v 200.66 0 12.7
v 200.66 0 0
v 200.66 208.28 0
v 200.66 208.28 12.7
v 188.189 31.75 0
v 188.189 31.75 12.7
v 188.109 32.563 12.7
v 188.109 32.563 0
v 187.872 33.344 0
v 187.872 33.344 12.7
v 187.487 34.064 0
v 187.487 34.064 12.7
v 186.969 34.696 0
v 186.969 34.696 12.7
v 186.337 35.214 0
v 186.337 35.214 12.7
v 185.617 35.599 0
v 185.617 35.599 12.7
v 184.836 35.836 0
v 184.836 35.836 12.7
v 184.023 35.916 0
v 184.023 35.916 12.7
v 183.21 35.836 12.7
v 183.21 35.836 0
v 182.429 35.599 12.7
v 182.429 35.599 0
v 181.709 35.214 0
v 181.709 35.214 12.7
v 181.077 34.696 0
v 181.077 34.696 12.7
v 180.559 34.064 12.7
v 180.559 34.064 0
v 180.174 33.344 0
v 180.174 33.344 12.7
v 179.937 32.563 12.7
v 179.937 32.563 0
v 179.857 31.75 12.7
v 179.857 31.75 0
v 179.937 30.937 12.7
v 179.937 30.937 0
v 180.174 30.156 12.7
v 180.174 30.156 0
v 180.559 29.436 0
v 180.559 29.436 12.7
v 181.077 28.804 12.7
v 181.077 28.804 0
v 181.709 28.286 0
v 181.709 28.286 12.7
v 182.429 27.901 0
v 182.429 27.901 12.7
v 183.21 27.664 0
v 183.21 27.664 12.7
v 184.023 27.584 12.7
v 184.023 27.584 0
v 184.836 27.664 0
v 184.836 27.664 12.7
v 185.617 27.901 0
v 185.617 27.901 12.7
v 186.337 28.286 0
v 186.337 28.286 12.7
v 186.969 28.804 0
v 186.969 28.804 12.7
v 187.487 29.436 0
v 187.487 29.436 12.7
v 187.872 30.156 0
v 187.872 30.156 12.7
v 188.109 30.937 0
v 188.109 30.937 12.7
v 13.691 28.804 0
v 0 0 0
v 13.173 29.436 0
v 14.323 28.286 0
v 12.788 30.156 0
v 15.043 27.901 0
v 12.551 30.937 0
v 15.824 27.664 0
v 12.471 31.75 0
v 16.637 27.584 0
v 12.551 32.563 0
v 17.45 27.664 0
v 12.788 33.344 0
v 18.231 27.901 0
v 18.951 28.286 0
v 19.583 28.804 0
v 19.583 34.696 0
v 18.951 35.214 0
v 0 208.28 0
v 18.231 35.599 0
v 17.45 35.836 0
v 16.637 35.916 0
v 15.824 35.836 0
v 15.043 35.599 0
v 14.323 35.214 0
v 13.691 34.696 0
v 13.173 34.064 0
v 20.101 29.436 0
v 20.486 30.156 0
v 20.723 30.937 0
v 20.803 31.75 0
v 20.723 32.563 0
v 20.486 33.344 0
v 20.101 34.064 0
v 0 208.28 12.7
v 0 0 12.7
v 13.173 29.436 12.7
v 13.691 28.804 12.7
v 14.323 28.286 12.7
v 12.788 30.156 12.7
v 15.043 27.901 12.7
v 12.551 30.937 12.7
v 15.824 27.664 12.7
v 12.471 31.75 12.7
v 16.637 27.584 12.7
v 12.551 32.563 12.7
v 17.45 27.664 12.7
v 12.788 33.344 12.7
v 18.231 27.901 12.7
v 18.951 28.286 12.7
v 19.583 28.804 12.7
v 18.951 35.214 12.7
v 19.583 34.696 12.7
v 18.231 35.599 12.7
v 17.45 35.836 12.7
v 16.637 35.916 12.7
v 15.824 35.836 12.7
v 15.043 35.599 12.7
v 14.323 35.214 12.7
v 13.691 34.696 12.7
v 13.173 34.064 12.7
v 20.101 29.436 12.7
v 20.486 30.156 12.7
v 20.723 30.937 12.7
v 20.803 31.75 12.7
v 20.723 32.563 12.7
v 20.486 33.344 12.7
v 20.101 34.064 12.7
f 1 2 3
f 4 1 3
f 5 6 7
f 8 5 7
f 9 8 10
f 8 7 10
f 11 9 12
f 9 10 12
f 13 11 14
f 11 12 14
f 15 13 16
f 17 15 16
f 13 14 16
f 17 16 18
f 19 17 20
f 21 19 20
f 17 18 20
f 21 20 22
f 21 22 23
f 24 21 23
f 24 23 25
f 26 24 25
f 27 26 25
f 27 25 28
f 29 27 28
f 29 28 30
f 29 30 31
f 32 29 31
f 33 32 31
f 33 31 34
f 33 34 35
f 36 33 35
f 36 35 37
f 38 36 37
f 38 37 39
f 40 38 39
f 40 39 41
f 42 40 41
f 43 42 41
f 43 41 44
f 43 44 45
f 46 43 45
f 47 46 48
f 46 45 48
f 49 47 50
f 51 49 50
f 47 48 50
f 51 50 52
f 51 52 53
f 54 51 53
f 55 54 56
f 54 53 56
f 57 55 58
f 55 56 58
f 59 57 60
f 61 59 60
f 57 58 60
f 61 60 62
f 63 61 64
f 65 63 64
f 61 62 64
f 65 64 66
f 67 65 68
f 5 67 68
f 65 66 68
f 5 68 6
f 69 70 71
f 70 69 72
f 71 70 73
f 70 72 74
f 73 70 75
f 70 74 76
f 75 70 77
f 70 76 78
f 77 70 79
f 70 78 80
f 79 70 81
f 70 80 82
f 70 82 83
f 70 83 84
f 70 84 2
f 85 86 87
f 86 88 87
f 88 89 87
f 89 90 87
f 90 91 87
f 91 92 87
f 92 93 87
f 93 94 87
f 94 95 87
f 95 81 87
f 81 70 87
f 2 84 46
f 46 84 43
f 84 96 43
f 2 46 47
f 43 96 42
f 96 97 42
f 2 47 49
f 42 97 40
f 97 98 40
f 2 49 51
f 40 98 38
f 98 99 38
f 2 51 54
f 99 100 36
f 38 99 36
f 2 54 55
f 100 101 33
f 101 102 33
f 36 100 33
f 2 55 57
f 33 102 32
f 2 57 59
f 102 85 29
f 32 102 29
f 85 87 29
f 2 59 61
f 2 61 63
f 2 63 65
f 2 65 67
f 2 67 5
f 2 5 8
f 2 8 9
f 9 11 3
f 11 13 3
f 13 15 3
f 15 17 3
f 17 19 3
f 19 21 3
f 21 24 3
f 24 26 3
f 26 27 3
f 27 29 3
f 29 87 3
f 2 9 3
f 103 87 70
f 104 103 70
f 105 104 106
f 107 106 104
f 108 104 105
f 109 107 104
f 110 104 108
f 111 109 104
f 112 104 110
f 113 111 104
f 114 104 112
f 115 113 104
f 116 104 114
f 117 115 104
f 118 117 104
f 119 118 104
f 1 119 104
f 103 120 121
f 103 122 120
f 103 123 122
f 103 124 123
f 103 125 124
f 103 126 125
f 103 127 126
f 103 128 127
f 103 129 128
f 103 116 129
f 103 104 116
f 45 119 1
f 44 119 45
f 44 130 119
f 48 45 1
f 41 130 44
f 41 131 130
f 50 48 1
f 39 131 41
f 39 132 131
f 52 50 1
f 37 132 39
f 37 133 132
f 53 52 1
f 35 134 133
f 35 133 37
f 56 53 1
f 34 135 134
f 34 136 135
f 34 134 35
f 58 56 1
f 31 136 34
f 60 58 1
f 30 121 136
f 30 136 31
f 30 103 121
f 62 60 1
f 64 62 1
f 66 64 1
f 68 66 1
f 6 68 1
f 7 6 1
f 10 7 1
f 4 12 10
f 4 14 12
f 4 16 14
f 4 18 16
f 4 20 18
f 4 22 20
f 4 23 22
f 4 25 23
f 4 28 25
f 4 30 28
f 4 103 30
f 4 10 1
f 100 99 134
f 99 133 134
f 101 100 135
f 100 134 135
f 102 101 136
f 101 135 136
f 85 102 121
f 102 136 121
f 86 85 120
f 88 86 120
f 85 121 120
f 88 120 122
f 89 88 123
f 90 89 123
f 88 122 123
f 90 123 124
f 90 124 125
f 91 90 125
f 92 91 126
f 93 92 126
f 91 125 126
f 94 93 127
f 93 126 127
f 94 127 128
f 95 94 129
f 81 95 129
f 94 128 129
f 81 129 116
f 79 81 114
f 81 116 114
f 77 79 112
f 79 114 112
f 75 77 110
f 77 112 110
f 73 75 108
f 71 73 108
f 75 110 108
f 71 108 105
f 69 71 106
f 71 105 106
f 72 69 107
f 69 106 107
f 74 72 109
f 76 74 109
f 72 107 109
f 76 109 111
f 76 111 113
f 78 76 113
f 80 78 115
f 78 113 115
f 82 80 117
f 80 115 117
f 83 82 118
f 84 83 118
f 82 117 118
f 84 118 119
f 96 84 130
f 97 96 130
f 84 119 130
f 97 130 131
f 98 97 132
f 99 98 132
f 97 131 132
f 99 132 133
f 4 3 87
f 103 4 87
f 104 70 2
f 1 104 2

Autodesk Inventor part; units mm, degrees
ref_plane "YZ Plane" through (0, 0, 0) normal (1, 0, 0) x (0, 1, 0)
ref_plane "XZ Plane" through (0, 0, 0) normal (0, 1, 0) x (-1, 0, 0)
ref_plane "XY Plane" through (0, 0, 0) normal (0, 0, 1) x (1, 0, 0)
sketch "Sketch1" plane through (0, 0, 0) normal (0, 0, 1) x (1, 0, 0)
  line L0 (0, 0) -> (200.66, 0)
  line L1 (200.66, 0) -> (200.66, 208.28)
  line L2 (200.66, 208.28) -> (0, 208.28)
  line L3 (0, 208.28) -> (0, 0)
  dimension "d0" = 200.66
  dimension "d1" = 208.28
extrude "Extrusion1" add sketch "Sketch1" along normal blind 12.7
sketch "Sketch2" plane through (0, 0, 12.7) normal (0, 0, 1) x (1, 0, 0)
  circle A0 centre (184.023, 31.75) radius 4.1656
  line L0 (0, 0) -> (200.66, 0) projected
  line L1 (200.66, 0) -> (200.66, 208.28) projected
  circle A1 centre (16.637, 31.75) radius 4.1656
  line L2 (0, 208.28) -> (0, 0) projected
  dimension "d4" = 8.3312
  dimension "d5" = 31.75
  dimension "d6" = 16.637
  dimension "d7" = 8.3312
  dimension "d8" = 16.637
  dimension "d9" = 31.75
extrude "Extrusion2" cut sketch "Sketch2" against normal blind 25.4
properties part number "Side wall"
